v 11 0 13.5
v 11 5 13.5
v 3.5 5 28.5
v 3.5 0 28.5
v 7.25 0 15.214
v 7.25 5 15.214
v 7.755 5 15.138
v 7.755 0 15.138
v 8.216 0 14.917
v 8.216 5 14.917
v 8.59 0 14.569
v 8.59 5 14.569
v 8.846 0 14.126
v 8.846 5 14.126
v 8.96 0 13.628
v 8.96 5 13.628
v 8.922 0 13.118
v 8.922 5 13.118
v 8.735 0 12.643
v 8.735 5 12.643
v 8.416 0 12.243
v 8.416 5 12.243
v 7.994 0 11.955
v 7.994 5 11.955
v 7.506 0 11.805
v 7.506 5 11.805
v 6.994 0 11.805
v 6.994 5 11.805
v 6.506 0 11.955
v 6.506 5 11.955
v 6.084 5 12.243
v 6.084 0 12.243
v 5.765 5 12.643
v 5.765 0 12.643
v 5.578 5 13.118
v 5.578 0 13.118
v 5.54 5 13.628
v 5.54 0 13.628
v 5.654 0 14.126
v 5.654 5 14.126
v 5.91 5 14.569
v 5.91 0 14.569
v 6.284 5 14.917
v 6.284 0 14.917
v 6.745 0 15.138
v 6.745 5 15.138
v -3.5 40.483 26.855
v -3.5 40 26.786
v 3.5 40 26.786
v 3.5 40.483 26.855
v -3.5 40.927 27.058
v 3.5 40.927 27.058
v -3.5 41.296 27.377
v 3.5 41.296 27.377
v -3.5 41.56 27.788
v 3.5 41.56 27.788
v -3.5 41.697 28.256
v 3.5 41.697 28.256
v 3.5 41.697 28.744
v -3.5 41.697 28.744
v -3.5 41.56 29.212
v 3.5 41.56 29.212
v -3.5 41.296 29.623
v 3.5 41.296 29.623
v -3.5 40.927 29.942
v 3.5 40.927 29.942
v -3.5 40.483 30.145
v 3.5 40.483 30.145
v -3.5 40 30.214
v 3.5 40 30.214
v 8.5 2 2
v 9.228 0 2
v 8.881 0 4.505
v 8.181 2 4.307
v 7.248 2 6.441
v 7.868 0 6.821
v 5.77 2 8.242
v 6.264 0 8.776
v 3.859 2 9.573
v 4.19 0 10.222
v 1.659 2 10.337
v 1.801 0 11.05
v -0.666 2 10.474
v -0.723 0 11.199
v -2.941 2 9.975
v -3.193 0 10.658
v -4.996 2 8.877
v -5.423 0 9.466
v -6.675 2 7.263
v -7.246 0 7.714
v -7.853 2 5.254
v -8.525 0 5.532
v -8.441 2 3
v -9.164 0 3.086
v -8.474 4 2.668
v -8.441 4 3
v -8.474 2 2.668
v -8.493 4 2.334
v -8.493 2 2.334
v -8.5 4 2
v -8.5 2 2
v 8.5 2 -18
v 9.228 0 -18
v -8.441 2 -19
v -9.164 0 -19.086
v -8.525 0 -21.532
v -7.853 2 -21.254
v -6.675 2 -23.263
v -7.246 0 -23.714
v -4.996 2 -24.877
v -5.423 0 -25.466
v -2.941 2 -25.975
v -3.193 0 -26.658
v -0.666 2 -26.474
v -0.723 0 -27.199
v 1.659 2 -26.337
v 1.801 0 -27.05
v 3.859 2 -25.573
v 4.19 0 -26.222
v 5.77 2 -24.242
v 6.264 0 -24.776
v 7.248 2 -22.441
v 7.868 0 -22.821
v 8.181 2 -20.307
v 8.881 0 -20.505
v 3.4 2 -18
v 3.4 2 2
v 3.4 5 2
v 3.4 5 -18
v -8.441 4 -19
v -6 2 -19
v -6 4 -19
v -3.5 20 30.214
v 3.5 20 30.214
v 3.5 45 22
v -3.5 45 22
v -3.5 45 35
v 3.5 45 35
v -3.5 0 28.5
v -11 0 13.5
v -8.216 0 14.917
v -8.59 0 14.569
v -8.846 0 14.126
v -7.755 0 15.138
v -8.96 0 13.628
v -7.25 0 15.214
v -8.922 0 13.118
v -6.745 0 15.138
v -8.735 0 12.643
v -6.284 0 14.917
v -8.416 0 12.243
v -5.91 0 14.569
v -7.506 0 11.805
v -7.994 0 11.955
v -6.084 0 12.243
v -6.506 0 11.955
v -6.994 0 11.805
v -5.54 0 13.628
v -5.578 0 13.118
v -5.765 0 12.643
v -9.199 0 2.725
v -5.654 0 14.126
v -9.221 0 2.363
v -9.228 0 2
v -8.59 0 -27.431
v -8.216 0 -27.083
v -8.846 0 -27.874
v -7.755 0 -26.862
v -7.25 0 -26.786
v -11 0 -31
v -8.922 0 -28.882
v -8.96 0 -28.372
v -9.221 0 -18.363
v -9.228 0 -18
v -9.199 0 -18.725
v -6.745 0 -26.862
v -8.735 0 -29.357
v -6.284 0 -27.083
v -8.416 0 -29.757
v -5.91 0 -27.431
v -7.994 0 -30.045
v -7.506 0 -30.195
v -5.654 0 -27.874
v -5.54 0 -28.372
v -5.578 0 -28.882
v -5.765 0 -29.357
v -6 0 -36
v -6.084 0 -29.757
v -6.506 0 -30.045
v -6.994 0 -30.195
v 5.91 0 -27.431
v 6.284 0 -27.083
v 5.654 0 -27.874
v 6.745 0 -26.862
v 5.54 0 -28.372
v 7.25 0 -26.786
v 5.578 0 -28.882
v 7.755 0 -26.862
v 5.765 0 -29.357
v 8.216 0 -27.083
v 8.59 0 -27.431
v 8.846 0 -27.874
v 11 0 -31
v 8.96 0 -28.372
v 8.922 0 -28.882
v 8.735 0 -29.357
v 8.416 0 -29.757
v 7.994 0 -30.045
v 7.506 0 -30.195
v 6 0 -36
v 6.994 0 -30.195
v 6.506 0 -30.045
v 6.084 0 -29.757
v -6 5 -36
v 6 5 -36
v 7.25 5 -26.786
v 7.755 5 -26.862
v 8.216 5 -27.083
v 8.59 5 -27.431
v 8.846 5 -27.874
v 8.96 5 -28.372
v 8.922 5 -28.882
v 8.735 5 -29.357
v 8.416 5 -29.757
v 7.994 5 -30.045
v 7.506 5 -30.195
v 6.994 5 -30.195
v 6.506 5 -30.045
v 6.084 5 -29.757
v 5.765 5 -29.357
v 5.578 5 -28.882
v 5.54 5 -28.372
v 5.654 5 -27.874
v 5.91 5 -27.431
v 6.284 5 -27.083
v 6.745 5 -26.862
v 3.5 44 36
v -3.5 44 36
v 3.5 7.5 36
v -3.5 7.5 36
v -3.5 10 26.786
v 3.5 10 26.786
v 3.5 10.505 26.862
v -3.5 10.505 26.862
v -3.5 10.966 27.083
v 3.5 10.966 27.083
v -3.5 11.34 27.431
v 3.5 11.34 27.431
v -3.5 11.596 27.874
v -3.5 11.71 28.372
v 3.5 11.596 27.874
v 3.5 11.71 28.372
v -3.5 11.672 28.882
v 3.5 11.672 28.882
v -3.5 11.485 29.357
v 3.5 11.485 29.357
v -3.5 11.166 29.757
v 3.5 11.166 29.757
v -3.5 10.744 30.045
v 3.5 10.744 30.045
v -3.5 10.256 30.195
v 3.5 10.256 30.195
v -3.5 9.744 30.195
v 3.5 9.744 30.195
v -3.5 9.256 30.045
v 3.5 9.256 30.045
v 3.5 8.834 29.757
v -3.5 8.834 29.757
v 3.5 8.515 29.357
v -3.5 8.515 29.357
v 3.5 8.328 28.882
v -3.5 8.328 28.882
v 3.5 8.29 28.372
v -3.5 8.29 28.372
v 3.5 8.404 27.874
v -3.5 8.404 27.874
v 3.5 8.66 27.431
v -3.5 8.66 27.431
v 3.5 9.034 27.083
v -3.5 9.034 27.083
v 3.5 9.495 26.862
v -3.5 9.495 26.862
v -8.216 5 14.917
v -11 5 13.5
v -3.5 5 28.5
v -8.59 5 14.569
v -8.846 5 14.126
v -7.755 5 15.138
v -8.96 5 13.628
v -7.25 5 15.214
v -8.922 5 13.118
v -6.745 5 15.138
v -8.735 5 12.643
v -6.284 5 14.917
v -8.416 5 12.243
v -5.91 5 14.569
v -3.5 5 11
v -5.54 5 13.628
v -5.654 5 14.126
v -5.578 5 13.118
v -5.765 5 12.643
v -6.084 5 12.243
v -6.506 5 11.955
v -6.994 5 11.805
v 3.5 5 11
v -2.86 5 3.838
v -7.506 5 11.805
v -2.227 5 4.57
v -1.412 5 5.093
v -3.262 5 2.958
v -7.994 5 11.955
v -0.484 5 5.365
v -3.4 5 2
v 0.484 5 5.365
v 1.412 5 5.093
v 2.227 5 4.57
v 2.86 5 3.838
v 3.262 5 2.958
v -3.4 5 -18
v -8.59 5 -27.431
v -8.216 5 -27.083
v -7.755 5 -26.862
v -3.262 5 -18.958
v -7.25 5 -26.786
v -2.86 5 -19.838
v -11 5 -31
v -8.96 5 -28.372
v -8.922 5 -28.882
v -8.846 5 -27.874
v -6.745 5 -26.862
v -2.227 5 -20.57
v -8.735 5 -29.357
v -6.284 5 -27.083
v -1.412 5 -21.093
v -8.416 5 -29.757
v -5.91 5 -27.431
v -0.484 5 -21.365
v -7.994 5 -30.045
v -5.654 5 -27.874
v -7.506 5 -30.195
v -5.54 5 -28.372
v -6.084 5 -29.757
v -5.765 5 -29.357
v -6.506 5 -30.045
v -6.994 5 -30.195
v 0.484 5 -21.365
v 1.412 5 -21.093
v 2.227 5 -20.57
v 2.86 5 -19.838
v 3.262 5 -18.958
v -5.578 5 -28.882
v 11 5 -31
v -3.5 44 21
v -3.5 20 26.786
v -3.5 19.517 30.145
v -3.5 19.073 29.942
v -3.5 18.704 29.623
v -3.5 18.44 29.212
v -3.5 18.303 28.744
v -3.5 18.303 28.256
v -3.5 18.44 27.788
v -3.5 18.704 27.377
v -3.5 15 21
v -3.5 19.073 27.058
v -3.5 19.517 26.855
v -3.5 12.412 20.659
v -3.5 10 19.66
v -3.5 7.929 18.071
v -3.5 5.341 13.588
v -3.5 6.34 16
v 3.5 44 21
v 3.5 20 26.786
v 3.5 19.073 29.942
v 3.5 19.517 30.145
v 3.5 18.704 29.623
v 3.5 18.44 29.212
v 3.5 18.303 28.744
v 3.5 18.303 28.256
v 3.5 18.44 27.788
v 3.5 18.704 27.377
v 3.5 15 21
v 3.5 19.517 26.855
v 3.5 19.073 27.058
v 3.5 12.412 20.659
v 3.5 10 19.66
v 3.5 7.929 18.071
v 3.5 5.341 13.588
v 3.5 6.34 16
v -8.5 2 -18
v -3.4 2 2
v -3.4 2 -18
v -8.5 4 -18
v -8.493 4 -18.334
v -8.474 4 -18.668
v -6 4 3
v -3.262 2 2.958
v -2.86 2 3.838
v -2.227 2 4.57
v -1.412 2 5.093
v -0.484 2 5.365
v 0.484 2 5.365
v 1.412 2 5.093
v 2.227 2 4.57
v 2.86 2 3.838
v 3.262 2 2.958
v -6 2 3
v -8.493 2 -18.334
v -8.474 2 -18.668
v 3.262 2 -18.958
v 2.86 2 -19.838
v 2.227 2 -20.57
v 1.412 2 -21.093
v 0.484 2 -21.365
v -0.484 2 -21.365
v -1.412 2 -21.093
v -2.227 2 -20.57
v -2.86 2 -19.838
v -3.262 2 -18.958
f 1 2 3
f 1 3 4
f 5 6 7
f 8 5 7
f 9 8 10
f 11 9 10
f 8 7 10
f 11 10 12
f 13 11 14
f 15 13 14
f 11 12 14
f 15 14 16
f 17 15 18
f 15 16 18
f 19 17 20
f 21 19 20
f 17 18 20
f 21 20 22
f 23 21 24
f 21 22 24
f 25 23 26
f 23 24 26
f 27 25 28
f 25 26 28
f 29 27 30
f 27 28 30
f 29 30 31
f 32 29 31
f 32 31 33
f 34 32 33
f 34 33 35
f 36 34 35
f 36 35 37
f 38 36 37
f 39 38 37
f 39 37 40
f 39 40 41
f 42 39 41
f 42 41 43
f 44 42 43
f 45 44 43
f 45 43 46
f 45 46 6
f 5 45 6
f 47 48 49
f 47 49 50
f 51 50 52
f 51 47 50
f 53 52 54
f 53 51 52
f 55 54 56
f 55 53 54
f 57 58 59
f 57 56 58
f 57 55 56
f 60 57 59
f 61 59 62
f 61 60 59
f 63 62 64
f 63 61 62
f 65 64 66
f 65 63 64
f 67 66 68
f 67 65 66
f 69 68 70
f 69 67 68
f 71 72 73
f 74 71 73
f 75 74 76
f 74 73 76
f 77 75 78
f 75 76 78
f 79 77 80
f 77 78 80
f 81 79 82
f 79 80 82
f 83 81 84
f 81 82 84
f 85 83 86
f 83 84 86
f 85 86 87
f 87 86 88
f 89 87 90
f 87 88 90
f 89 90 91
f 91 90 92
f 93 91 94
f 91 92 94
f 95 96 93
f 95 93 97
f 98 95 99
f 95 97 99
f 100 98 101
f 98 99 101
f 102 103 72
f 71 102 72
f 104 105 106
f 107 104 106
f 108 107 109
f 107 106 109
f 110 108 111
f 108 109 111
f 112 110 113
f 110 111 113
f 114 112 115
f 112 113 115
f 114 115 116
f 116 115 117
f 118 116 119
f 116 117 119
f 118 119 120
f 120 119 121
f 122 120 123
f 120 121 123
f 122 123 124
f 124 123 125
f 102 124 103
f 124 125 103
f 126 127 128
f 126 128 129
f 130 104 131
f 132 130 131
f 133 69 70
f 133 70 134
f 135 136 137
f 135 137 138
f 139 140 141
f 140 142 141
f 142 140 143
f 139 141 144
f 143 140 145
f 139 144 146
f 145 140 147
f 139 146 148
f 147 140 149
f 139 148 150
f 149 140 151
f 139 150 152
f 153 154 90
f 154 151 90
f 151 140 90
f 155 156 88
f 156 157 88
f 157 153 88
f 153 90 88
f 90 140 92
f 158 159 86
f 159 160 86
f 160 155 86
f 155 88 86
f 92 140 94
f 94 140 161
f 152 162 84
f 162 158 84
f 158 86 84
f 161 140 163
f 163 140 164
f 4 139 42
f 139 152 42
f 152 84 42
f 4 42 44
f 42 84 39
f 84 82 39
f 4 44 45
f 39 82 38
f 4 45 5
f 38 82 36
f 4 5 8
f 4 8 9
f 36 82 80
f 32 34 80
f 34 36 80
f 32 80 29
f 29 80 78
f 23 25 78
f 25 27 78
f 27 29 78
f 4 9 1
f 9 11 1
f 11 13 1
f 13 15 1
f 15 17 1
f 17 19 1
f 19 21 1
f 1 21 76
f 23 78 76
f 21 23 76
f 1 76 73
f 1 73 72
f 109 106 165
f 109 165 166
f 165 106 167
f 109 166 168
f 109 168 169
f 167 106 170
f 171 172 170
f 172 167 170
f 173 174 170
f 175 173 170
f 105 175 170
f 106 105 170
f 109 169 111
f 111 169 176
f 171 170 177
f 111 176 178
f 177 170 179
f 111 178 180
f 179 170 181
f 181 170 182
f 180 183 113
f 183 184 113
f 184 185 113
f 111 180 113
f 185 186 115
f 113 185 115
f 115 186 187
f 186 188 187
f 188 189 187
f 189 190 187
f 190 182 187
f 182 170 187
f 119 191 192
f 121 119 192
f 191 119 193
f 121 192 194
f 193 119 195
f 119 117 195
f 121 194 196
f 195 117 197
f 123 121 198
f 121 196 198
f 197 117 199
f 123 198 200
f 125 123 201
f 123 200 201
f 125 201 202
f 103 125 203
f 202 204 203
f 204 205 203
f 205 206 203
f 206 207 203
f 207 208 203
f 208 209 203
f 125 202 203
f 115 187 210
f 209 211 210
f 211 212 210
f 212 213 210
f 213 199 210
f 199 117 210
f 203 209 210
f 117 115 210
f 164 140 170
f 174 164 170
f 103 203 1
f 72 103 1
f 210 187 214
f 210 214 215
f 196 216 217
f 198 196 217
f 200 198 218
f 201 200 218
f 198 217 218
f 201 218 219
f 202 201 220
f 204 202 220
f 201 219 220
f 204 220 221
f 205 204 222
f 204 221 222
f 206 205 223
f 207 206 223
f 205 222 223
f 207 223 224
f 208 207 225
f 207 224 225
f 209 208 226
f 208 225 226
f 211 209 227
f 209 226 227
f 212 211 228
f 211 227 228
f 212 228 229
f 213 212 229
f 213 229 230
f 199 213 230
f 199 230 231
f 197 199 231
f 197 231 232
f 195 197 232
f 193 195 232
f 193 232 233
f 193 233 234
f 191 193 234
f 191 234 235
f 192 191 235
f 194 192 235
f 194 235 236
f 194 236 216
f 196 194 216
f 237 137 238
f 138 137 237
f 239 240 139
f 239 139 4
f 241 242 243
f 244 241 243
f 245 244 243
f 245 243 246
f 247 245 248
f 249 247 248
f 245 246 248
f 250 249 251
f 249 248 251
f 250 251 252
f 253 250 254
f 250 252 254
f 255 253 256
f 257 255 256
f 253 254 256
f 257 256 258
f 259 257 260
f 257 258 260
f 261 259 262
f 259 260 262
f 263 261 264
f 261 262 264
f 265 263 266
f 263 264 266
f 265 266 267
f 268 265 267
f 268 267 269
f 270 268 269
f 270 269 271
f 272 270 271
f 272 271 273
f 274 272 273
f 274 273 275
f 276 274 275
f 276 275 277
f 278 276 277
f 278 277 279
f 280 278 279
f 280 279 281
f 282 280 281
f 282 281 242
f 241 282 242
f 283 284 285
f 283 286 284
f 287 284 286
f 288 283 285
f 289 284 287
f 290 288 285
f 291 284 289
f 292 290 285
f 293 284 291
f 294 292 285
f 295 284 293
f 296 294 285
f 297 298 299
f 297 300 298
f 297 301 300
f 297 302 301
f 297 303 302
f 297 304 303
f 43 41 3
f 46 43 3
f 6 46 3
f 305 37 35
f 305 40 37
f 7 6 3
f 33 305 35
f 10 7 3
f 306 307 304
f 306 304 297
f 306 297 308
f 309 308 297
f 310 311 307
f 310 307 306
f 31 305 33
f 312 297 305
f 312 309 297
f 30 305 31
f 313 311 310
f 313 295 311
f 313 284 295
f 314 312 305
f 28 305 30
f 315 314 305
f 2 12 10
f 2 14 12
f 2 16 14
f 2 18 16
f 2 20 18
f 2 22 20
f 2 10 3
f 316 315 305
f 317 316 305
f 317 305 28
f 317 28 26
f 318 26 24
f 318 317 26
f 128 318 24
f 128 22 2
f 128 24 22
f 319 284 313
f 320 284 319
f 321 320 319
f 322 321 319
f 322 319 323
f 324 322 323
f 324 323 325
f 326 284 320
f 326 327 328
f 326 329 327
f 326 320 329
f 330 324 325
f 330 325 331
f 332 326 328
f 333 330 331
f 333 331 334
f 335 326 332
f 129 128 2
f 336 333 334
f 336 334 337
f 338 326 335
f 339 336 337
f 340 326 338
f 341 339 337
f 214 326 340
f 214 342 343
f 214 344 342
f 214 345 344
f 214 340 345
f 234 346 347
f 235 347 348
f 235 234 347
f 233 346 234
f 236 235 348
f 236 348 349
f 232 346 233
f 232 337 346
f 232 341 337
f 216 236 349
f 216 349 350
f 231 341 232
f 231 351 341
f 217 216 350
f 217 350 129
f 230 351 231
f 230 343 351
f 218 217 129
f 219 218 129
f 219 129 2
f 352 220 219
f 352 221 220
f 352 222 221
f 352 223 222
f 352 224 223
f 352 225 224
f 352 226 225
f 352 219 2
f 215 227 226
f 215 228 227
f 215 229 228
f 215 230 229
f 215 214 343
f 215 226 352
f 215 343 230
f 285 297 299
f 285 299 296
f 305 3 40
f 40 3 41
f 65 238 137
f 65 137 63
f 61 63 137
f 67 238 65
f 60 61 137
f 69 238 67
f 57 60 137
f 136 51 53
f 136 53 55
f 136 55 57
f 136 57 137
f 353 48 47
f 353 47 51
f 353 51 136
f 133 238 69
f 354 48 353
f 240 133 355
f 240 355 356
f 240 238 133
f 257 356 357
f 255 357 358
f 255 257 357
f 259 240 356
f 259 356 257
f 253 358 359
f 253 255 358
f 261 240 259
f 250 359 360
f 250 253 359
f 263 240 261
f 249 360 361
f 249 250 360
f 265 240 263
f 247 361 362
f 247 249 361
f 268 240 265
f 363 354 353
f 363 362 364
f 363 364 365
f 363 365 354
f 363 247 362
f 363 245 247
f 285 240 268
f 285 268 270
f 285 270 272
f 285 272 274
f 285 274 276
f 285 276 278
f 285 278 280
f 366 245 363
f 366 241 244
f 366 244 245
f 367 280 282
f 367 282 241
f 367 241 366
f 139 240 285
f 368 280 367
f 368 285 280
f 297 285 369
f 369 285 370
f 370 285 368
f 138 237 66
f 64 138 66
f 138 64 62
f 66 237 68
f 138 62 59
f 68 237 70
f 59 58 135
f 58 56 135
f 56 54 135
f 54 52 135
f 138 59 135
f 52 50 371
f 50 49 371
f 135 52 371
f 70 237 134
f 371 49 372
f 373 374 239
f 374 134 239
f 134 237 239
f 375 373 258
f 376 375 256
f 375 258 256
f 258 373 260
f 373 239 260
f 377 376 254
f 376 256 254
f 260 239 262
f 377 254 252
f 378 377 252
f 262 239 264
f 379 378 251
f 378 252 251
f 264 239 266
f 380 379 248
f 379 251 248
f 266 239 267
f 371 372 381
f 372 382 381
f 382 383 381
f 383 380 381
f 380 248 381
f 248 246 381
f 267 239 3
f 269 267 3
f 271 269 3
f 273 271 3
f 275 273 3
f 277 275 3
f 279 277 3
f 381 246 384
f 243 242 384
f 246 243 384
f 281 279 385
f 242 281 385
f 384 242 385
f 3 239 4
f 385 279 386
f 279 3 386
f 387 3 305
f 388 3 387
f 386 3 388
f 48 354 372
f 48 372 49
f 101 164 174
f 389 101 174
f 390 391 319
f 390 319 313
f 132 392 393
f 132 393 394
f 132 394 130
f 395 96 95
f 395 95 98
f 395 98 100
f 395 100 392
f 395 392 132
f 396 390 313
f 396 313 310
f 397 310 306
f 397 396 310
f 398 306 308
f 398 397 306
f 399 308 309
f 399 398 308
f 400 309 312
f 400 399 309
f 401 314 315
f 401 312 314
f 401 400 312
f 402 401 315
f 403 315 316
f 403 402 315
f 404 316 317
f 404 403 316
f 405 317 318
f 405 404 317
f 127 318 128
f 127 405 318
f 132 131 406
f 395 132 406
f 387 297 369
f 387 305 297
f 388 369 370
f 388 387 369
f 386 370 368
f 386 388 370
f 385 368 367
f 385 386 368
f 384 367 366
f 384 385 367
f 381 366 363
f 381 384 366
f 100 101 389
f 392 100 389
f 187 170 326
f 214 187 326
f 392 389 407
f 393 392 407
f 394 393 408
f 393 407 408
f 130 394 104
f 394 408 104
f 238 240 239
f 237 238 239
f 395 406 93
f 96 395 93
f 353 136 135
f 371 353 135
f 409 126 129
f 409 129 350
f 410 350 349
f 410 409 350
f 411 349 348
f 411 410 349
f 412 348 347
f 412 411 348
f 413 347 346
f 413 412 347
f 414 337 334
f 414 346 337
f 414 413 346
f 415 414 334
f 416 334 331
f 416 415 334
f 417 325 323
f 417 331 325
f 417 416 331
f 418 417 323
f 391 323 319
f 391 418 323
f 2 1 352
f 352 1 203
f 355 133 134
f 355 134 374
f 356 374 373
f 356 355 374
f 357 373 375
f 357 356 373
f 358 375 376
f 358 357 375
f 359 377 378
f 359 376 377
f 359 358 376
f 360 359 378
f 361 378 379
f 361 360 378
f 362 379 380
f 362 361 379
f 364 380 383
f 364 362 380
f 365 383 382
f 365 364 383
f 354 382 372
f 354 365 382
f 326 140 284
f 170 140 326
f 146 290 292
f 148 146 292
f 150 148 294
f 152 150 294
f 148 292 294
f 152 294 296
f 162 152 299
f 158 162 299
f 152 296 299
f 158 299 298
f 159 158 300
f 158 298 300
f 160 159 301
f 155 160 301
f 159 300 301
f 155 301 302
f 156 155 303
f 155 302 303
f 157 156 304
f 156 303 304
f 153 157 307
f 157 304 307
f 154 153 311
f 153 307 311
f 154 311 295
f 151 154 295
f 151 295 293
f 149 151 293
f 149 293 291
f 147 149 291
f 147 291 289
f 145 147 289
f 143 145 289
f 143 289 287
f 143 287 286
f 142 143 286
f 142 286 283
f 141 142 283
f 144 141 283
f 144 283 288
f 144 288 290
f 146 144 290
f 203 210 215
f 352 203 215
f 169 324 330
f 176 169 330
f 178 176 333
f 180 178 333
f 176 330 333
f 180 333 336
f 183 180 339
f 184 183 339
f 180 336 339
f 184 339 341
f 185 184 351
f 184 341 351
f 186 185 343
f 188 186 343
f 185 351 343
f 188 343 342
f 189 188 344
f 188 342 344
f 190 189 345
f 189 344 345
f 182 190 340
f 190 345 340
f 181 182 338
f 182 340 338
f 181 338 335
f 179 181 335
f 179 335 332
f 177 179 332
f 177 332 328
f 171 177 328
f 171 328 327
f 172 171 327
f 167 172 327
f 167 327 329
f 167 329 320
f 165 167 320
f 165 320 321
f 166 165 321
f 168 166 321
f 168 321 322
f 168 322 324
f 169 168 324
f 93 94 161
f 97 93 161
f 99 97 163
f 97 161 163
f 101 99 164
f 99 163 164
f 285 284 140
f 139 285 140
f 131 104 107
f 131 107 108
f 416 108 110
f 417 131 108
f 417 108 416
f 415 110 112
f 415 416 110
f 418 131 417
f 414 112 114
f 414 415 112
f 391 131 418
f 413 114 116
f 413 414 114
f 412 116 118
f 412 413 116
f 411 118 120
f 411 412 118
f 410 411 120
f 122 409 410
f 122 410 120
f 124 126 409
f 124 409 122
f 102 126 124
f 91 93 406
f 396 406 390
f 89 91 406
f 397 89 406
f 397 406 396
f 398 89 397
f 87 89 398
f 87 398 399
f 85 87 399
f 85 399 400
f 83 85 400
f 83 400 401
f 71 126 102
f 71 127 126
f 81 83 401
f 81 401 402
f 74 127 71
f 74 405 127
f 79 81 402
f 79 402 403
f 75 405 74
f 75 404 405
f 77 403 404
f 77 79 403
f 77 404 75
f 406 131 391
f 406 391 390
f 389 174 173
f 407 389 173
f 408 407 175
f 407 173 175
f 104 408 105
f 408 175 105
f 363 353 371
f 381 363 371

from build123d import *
from OCP.BRepFilletAPI import BRepFilletAPI_MakeChamfer

# Parameters (mm, degrees)
SKETCH1_W           = 22
SKETCH1_H           = 72
BOSS_EXTRUDE1_DEPTH = 5
SKETCH2_W           = 7
SKETCH2_H           = 15
BOSS_EXTRUDE2_DEPTH = 40
CHAMFER1_SIZE       = 1
FILLET1_R           = 10
CUT_EXTRUDE2_DEPTH  = 59.668560575
SKETCH6_W           = 7.5
SKETCH6_H           = 7.5
CUT_EXTRUDE3_DEPTH  = 55.927224579
CHAMFER2_SIZE2      = 15
CHAMFER2_SIZE       = 7.5
CHAMFER7_SIZE       = 7.5
CHAMFER3_SIZE       = 5
CUT_EXTRUDE6_DEPTH  = 2
CUT_EXTRUDE7_DEPTH  = 4
CHAMFER4_SIZE       = 2
CHAMFER4_SIZE_2     = 0.727940469
CUT_EXTRUDE8_DEPTH  = 60.42432162
CHAMFER8_SIZE2      = 7.5
CHAMFER8_SIZE       = 15
SKETCH12_R          = 1.7145
CUT_EXTRUDE9_DEPTH  = 60.42432162
SKETCH13_R          = 1.7145
CUT_EXTRUDE10_DEPTH = 55.927224579


with BuildPart() as part:
    # Sketch1 → Boss-Extrude1 (new body)
    with BuildSketch(Plane(origin=(0, 0, 0), x_dir=(1, 0, 0), z_dir=(0, 1, 0))):
        Rectangle(SKETCH1_W, SKETCH1_H)
    extrude(amount=BOSS_EXTRUDE1_DEPTH)

    # Sketch2 → Boss-Extrude2 (add)
    with BuildSketch(Plane(origin=(0, 5, 0), x_dir=(1, 0, 0), z_dir=(0, 1, 0))):
        with Locations((0, -28.5)):
            Rectangle(SKETCH2_W, SKETCH2_H)
    extrude(amount=BOSS_EXTRUDE2_DEPTH)

    # Chamfer1
    chamfer1_edges = [part.edges().sort_by_distance(p)[0] for p in [
        (0, 45, 36),
        (0, 45, 21),
    ]]
    chamfer(chamfer1_edges, length=CHAMFER1_SIZE)

    # Fillet1
    fillet1_edges = [part.edges().sort_by_distance(p)[0] for p in [
        (0, 5, 21),
    ]]
    fillet(fillet1_edges, radius=FILLET1_R)

    # Sketch5 → Cut-Extrude2 (cut, through all)
    with BuildSketch(Plane.XZ):
        with BuildLine():
            Line((3.4, 2), (3.4, -18))
            ThreePointArc((3.4, -18), (0, -21.4), (-3.4, -18))
            Line((-3.4, -18), (-3.4, 2))
            ThreePointArc((-3.4, 2), (0, 5.4), (3.4, 2))
        make_face()
    extrude(amount=-CUT_EXTRUDE2_DEPTH, mode=Mode.SUBTRACT)

    # Sketch6 → Cut-Extrude3 (cut, through all)
    with BuildSketch(Plane(origin=(0, 5, 0), x_dir=(1, 0, 0), z_dir=(0, 1, 0))):
        with Locations((7.25, -32.25)):
            Rectangle(SKETCH6_W, SKETCH6_H)
    cut_extrude3 = extrude(amount=-CUT_EXTRUDE3_DEPTH, mode=Mode.SUBTRACT)

    # Mirror1: Cut-Extrude3 across plane
    add(cut_extrude3.mirror(Plane(origin=(0, 0, 0), x_dir=(0, 0, 1), z_dir=(1, 0, 0))), mode=Mode.SUBTRACT)

    # Chamfer2
    chamfer2_edges = [part.edges().sort_by_distance(p)[0] for p in [
        (11, 2.5, 28.5),
    ]]
    chamfer2_side = [part.faces().sort_by_distance(p)[0] for p in [
        (10.85, 2.5, 28.5),
    ]]
    chamfer(chamfer2_edges, length=CHAMFER2_SIZE - 0.0001, length2=CHAMFER2_SIZE2 - 0.0001, reference=chamfer2_side[0])  # a hair under: the kernel refuses the full size

    # Chamfer7
    chamfer7_edges = [part.edges().sort_by_distance(p)[0] for p in [
        (0, 0, 36),
    ]]
    chamfer(chamfer7_edges, length=CHAMFER7_SIZE)

    # Chamfer3
    chamfer3_edges = [part.edges().sort_by_distance(p)[0] for p in [
        (-11, 2.5, -36),
        (11, 2.5, -36),
    ]]
    chamfer(chamfer3_edges, length=CHAMFER3_SIZE)

    # Sketch8 → Cut-Extrude6 (cut)
    # profile 1 of 2: a face of its own
    with BuildSketch(Plane.XZ):
        with BuildLine():
            Line((8.5, -18), (8.5, 2))
            ThreePointArc((8.5, 2), (0.500870333, 10.485230045), (-8.440971508, 3))
            Line((-8.440971508, 3), (-6, 3))
            Line((-6, 3), (-6, -19))
            Line((-6, -19), (-8.440971508, -19))
            ThreePointArc((-8.440971508, -19), (0.500870333, -26.485230045), (8.5, -18))
        make_face()
        with BuildLine():
            Line((-3.4, -18), (-3.4, 2))
            ThreePointArc((-3.4, 2), (0, 5.4), (3.4, 2))
            Line((3.4, 2), (3.4, -18))
            ThreePointArc((3.4, -18), (0, -21.4), (-3.4, -18))
        make_face(mode=Mode.SUBTRACT)
    # profile 2 of 2: a face of its own
    with BuildSketch(Plane.XZ):
        with BuildLine():
            Line((-6, 3), (-8.440971508, 3))
            ThreePointArc((-8.440971508, 3), (-8.485230045, 2.500870333), (-8.5, 2))
            Line((-8.5, 2), (-8.5, -18))
            ThreePointArc((-8.5, -18), (-8.485230045, -18.500870333), (-8.440971508, -19))
            Line((-8.440971508, -19), (-6, -19))
            Line((-6, -19), (-6, 3))
        make_face()
    extrude(amount=-CUT_EXTRUDE6_DEPTH, mode=Mode.SUBTRACT)

    # Sketch8<3> → Cut-Extrude7 (cut)
    with BuildSketch(Plane.XZ):
        with BuildLine():
            Line((-6, 3), (-8.440971508, 3))
            ThreePointArc((-8.440971508, 3), (-8.485230045, 2.500870333), (-8.5, 2))
            Line((-8.5, 2), (-8.5, -18))
            ThreePointArc((-8.5, -18), (-8.485230045, -18.500870333), (-8.440971508, -19))
            Line((-8.440971508, -19), (-6, -19))
            Line((-6, -19), (-6, 3))
        make_face()
    extrude(amount=-CUT_EXTRUDE7_DEPTH, mode=Mode.SUBTRACT)

    # Chamfer4
    chamfer4_edges_1 = [part.edges().sort_by_distance(p)[0] for p in [
        (8.5, 0, -8),
    ]]
    chamfer4_side_1 = [part.faces().sort_by_distance(p)[0] for p in [
        (8.5, 0.014558809, -8),
    ]]
    chamfer4_edges_2 = [part.edges().sort_by_distance(p)[0] for p in [
        (0, 0, -26.5),
    ]]
    chamfer4_side_2 = [part.faces().sort_by_distance(p)[0] for p in [
        (0, 0, -26.514558809),
    ]]
    chamfer4_edges_3 = [part.edges().sort_by_distance(p)[0] for p in [
        (0, 0, 10.5),
    ]]
    chamfer4_side_3 = [part.faces().sort_by_distance(p)[0] for p in [
        (0, 0, 10.514558809),
    ]]
    chamfer4_edges_4 = [part.edges().sort_by_distance(p)[0] for p in [
        (-8.5, 0, -8),
    ]]
    chamfer4_side_4 = [part.faces().sort_by_distance(p)[0] for p in [
        (-8.514558809, 0, -8),
    ]]
    chamfer4 = BRepFilletAPI_MakeChamfer(part.part.solid().wrapped)
    for e in chamfer4_edges_1:
        chamfer4.Add(CHAMFER4_SIZE - 0.0001, CHAMFER4_SIZE_2 - 0.0001, e.wrapped, chamfer4_side_1[0].wrapped)
    for e in chamfer4_edges_2:
        chamfer4.Add(CHAMFER4_SIZE - 0.0001, CHAMFER4_SIZE_2 - 0.0001, e.wrapped, chamfer4_side_2[0].wrapped)
    for e in chamfer4_edges_3:
        chamfer4.Add(CHAMFER4_SIZE - 0.0001, CHAMFER4_SIZE_2 - 0.0001, e.wrapped, chamfer4_side_3[0].wrapped)
    for e in chamfer4_edges_4:
        chamfer4.Add(CHAMFER4_SIZE - 0.0001, CHAMFER4_SIZE_2 - 0.0001, e.wrapped, chamfer4_side_4[0].wrapped)
    add(Compound.cast(chamfer4.Shape()), mode=Mode.REPLACE)  # a hair under: the kernel refuses the full size

    # Sketch9 → Cut-Extrude8 (cut, through all)
    with BuildSketch(Plane.ZY.offset(3.5)):
        with BuildLine():
            Line((26.7855, 20), (26.7855, 40))
            ThreePointArc((26.7855, 40), (28.5, 41.7145), (30.2145, 40))
            Line((30.2145, 40), (30.2145, 20))
            ThreePointArc((30.2145, 20), (28.5, 18.2855), (26.7855, 20))
        make_face()
    extrude(amount=-CUT_EXTRUDE8_DEPTH, mode=Mode.SUBTRACT)

    # Chamfer8
    chamfer8_edges = [part.edges().sort_by_distance(p)[0] for p in [
        (-11, 2.5, 28.5),
    ]]
    chamfer8_side = [part.faces().sort_by_distance(p)[0] for p in [
        (-11, 2.5, 28.35),
    ]]
    chamfer(chamfer8_edges, length=CHAMFER8_SIZE - 0.0001, length2=CHAMFER8_SIZE2 - 0.0001, reference=chamfer8_side[0])  # a hair under: the kernel refuses the full size

    # Sketch12 → Cut-Extrude9 (cut, through all)
    with BuildSketch(Plane(origin=(3.5, 0, 0), x_dir=(0, 0, -1), z_dir=(1, 0, 0))):
        with Locations((-28.5, 10)):
            Circle(SKETCH12_R)
    extrude(amount=-CUT_EXTRUDE9_DEPTH, mode=Mode.SUBTRACT)

    # Sketch13 → Cut-Extrude10 (cut, through all)
    with BuildSketch(Plane(origin=(0, 5, 0), x_dir=(1, 0, 0), z_dir=(0, 1, 0))):
        with Locations(Location((-7.25, -13.5, 0), (0, 0, 270))):
            Circle(SKETCH13_R)
        with Locations(Location((7.25, -13.5, 0), (0, 0, 270))):
            Circle(SKETCH13_R)
        with Locations(Location((-7.25, 28.5, 0), (0, 0, 270))):
            Circle(SKETCH13_R)
        with Locations(Location((7.25, 28.5, 0), (0, 0, 270))):
            Circle(SKETCH13_R)
    extrude(amount=-CUT_EXTRUDE10_DEPTH, mode=Mode.SUBTRACT)


solid = part.part
